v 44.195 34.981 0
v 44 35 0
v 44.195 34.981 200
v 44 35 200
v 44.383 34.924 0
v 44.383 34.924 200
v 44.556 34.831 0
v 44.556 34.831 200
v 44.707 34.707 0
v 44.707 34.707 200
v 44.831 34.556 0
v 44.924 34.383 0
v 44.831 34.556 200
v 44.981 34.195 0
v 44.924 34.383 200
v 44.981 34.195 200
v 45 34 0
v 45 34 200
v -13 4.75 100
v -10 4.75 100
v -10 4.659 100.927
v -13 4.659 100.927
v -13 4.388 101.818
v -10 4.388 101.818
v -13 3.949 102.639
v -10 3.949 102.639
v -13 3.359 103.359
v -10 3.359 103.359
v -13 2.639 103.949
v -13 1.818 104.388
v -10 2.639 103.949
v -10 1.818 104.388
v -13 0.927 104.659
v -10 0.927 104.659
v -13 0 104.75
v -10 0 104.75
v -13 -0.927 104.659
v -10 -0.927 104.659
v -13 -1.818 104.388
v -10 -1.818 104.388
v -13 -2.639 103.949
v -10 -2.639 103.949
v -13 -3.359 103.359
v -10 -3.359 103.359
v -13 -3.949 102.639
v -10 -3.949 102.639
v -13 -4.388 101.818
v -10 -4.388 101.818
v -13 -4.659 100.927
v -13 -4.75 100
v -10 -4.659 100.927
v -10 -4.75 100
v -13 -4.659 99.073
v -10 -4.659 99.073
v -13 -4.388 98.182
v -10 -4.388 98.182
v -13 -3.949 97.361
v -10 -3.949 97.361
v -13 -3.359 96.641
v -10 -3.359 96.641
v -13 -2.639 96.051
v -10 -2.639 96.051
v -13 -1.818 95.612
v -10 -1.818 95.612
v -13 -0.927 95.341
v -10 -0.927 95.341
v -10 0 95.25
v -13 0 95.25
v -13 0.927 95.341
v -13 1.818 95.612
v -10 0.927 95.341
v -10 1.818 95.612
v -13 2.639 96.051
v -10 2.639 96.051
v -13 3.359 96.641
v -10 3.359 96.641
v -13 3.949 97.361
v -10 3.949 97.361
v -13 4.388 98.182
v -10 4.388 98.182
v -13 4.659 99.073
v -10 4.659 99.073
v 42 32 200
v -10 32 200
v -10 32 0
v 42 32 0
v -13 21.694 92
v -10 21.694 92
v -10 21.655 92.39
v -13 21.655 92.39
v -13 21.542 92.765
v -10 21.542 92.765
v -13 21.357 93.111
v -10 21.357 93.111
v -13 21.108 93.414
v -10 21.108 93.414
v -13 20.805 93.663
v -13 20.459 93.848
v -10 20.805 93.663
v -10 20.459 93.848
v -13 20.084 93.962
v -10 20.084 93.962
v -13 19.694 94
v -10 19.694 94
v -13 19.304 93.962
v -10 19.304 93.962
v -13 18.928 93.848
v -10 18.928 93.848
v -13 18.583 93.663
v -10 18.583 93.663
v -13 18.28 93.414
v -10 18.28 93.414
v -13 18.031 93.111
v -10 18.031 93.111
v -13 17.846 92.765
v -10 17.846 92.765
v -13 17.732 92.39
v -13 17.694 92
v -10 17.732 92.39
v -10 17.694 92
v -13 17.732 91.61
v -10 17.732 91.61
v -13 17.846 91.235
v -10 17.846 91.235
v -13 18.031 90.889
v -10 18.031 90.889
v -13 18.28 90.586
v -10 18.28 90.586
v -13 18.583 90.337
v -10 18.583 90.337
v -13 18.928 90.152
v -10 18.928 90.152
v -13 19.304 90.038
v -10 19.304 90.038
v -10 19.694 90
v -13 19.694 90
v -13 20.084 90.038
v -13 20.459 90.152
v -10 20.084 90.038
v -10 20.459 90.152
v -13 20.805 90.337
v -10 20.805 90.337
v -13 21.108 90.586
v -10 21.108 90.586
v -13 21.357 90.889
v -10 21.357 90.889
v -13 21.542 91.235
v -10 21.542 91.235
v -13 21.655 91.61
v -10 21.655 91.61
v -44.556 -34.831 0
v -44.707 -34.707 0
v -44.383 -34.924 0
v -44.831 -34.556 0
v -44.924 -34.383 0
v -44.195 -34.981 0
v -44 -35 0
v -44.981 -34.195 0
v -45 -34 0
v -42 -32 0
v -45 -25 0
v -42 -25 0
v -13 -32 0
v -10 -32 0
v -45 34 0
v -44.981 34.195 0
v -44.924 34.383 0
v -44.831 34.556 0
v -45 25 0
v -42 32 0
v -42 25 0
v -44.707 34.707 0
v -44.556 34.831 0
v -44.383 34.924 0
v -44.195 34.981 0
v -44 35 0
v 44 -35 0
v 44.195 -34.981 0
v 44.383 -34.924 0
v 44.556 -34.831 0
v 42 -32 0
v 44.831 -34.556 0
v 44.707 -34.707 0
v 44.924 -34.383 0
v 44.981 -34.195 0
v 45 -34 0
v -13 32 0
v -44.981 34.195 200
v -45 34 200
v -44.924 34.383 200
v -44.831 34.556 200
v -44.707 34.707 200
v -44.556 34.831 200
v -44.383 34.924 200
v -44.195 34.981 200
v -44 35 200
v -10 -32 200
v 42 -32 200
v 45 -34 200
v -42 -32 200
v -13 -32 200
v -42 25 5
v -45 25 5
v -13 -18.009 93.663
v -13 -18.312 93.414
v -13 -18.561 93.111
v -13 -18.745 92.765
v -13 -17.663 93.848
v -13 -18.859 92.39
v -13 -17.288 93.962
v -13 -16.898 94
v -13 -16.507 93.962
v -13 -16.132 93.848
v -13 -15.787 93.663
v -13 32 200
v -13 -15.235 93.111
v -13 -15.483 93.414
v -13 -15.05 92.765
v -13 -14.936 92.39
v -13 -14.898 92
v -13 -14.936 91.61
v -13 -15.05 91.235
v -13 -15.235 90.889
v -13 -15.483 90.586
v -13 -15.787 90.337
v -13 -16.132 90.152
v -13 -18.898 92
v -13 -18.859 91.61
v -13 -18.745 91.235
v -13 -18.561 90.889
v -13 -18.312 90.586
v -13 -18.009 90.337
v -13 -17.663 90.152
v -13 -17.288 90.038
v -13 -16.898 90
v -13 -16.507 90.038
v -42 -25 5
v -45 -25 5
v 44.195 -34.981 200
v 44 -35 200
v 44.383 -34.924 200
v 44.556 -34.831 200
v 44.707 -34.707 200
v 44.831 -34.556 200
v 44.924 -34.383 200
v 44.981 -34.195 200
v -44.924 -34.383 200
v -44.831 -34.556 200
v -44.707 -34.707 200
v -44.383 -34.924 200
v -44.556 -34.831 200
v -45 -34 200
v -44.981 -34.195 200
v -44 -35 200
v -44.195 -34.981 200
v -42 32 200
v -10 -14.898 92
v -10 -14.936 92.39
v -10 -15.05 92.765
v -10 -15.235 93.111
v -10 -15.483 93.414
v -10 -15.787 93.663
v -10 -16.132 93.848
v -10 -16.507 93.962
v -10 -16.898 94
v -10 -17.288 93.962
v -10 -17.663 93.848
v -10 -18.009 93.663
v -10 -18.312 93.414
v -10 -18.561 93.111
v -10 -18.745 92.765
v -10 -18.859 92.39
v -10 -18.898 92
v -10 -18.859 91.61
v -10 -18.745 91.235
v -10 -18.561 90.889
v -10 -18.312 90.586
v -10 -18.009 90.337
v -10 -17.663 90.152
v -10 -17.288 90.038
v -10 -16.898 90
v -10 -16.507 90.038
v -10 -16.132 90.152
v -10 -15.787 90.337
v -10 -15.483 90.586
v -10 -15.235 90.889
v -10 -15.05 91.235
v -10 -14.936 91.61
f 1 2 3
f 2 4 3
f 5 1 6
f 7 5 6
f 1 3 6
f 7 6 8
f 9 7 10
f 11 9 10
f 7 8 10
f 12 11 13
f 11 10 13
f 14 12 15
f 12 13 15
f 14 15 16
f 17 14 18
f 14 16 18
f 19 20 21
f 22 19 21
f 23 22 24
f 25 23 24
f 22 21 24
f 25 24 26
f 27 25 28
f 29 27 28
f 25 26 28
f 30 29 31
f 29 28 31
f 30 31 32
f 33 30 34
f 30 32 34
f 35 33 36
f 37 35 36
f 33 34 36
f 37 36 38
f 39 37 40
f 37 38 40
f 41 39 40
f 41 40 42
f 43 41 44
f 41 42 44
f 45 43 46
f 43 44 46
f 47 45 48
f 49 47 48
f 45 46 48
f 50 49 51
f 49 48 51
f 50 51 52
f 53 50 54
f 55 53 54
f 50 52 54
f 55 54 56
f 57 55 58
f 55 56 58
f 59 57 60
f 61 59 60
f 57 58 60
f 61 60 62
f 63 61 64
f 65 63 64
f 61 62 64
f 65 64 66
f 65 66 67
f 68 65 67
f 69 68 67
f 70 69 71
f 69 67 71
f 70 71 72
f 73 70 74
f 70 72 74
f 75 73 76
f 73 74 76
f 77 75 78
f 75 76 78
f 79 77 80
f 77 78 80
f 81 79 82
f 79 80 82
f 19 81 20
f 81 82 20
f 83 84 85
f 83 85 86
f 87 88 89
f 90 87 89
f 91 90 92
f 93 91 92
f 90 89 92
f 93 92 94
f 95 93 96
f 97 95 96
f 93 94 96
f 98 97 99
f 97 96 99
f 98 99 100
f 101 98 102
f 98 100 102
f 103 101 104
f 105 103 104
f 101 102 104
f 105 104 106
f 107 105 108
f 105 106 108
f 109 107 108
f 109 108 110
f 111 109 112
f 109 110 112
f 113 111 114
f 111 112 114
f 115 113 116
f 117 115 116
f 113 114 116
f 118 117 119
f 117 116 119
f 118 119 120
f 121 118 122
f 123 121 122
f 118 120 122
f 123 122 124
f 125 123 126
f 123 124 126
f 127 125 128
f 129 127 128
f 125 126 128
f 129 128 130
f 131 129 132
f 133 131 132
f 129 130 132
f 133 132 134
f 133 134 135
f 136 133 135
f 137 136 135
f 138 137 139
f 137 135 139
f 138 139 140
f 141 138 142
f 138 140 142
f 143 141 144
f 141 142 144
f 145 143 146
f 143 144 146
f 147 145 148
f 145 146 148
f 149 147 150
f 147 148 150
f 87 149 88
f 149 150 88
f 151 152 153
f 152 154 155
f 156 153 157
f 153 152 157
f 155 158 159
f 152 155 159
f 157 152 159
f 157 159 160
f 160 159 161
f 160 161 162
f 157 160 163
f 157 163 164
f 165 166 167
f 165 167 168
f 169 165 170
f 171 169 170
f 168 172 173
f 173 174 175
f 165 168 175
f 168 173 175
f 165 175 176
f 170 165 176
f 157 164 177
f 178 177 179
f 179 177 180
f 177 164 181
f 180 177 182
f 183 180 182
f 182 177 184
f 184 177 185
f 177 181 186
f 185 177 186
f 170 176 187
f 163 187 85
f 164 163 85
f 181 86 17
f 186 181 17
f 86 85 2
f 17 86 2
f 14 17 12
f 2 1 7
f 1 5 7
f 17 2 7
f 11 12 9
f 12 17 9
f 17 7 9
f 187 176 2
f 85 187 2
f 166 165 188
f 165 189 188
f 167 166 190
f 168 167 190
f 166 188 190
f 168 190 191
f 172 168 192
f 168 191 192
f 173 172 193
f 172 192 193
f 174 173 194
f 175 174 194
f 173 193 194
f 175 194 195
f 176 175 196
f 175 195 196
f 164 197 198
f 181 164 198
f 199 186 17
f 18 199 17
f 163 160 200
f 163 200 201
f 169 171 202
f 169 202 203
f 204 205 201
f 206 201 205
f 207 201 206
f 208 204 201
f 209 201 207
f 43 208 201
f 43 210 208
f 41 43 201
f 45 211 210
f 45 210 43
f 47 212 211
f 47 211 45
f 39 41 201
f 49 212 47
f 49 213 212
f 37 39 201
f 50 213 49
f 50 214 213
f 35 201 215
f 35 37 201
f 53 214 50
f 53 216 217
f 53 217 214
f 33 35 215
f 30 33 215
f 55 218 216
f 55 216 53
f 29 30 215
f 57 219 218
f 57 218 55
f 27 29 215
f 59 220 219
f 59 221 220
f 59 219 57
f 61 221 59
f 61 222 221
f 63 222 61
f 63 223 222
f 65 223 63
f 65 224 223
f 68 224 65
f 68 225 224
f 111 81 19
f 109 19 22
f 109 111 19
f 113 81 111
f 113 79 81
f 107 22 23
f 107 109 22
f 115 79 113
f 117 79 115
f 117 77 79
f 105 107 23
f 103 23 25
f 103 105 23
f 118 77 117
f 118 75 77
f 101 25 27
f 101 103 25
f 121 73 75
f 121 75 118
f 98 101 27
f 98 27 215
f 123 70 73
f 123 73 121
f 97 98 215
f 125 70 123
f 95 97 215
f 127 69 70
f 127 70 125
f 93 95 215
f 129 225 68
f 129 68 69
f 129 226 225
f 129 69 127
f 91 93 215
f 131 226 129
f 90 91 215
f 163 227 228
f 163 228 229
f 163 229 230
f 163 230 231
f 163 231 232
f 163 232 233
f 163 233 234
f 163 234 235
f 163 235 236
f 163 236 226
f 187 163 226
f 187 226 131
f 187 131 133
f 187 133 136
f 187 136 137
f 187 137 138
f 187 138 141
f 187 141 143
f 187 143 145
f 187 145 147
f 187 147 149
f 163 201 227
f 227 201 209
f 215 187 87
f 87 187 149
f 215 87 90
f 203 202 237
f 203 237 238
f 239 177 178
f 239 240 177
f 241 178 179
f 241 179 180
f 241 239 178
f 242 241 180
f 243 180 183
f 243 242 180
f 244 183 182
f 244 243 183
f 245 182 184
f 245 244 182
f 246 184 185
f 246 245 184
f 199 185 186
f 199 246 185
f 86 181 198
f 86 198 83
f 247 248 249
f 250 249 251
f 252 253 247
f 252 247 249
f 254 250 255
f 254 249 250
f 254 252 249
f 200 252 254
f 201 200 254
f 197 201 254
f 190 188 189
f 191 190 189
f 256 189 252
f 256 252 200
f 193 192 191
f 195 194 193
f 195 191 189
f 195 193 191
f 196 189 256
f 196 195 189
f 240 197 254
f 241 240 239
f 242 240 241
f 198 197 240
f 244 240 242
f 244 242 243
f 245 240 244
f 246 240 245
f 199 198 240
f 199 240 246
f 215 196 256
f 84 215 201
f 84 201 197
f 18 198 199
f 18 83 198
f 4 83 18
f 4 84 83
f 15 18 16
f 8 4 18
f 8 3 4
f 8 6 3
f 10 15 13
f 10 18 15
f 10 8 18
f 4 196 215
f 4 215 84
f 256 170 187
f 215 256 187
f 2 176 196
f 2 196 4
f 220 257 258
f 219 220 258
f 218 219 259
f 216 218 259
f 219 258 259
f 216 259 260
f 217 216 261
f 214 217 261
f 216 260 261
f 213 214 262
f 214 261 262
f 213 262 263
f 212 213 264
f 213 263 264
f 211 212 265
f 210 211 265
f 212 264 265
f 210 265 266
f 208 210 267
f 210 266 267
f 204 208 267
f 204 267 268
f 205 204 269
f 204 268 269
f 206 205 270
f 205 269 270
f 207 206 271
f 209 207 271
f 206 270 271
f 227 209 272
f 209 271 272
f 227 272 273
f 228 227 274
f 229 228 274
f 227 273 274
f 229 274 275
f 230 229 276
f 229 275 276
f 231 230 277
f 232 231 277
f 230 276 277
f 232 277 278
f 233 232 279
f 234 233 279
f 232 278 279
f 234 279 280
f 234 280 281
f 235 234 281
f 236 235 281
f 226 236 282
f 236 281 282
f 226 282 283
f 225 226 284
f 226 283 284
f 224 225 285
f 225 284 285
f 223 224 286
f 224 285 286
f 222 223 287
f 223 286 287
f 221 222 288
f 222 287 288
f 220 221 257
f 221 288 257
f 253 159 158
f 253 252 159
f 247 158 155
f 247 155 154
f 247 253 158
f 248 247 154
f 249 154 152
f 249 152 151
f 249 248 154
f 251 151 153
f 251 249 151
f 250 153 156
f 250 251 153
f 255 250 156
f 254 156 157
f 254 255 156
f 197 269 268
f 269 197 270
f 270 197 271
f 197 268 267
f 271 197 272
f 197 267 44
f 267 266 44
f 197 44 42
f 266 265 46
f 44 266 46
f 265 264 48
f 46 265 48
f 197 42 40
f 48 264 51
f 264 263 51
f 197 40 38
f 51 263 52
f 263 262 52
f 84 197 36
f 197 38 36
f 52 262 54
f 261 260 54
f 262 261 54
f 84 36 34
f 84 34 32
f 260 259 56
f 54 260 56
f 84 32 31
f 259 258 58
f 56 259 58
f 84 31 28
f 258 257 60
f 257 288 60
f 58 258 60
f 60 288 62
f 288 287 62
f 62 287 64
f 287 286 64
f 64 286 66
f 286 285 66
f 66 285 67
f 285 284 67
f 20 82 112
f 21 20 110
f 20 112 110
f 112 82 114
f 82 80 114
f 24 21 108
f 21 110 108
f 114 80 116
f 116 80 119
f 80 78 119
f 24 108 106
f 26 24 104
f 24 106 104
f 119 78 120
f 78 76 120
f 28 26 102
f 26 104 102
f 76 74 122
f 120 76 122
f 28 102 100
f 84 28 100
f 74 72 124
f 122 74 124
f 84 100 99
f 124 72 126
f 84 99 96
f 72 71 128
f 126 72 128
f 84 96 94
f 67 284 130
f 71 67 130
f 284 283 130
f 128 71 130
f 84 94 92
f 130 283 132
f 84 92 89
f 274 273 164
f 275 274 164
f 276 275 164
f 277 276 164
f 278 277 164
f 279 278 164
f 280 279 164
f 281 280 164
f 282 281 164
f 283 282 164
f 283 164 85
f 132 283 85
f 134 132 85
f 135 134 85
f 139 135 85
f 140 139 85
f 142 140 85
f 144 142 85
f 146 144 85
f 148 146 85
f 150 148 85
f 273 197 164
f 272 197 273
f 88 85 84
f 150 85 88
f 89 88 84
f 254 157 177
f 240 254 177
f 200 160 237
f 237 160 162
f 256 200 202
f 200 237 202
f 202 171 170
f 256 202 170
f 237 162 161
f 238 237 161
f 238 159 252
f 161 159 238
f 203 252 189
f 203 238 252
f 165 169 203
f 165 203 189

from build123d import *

# Parameters (mm, degrees)
ESBO_O1_W                = 90
ESBO_O1_H                = 70
ESBO_O1_W_2              = 29
ESBO_O1_H_2              = 64
ESBO_O1_W_3              = 52
RESSALTO_EXTRUS_O1_DEPTH = 200
FILETE1_R                = 1
ESBO_O4_R                = 4.75
ESBO_O4_R_2              = 2
CORTE_EXTRUS_O1_DEPTH    = 3
ESBO_O5_W                = 10.309676721
ESBO_O5_H                = 50
CORTE_EXTRUS_O2_DEPTH    = 5


with BuildPart() as part:
    # Esboço1 → Ressalto-extrusão1 (new body)
    with BuildSketch(Plane.XY):
        Rectangle(ESBO_O1_W, ESBO_O1_H)
        with Locations((-27.5, 0)):
            Rectangle(ESBO_O1_W_2, ESBO_O1_H_2, mode=Mode.SUBTRACT)
        with Locations((16, 0)):
            Rectangle(ESBO_O1_W_3, ESBO_O1_H_2, mode=Mode.SUBTRACT)
    extrude(amount=RESSALTO_EXTRUS_O1_DEPTH)

    # Filete1
    filete1_edges = [part.edges().sort_by_distance(p)[0] for p in [
        (45, -35, 100),
        (-45, -35, 100),
        (-45, 35, 100),
        (45, 35, 100),
    ]]
    fillet(filete1_edges, radius=FILETE1_R)

    # Esboço4 → Corte-extrusão1 (cut)
    with BuildSketch(Plane(origin=(-10, 0, 0), x_dir=(0, 0, -1), z_dir=(1, 0, 0))):
        with Locations(Location((-100, 0, 0), (0, 0, 90))):
            Circle(ESBO_O4_R)
        with Locations(Location((-92, 19.69381461, 0), (0, 0, 90))):
            Circle(ESBO_O4_R_2)
        with Locations(Location((-92, -16.897667481, 0), (0, 0, 90))):
            Circle(ESBO_O4_R_2)
    extrude(amount=-CORTE_EXTRUS_O1_DEPTH, mode=Mode.SUBTRACT)

    # Esboço5 → Corte-extrusão2 (cut)
    with BuildSketch(Plane(origin=(0, 0, 0), x_dir=(-1, 0, 0), z_dir=(0, 0, -1))):
        with Locations((43.55720026, 0)):
            Rectangle(ESBO_O5_W, ESBO_O5_H)
    extrude(amount=-CORTE_EXTRUS_O2_DEPTH, mode=Mode.SUBTRACT)


solid = part.part
